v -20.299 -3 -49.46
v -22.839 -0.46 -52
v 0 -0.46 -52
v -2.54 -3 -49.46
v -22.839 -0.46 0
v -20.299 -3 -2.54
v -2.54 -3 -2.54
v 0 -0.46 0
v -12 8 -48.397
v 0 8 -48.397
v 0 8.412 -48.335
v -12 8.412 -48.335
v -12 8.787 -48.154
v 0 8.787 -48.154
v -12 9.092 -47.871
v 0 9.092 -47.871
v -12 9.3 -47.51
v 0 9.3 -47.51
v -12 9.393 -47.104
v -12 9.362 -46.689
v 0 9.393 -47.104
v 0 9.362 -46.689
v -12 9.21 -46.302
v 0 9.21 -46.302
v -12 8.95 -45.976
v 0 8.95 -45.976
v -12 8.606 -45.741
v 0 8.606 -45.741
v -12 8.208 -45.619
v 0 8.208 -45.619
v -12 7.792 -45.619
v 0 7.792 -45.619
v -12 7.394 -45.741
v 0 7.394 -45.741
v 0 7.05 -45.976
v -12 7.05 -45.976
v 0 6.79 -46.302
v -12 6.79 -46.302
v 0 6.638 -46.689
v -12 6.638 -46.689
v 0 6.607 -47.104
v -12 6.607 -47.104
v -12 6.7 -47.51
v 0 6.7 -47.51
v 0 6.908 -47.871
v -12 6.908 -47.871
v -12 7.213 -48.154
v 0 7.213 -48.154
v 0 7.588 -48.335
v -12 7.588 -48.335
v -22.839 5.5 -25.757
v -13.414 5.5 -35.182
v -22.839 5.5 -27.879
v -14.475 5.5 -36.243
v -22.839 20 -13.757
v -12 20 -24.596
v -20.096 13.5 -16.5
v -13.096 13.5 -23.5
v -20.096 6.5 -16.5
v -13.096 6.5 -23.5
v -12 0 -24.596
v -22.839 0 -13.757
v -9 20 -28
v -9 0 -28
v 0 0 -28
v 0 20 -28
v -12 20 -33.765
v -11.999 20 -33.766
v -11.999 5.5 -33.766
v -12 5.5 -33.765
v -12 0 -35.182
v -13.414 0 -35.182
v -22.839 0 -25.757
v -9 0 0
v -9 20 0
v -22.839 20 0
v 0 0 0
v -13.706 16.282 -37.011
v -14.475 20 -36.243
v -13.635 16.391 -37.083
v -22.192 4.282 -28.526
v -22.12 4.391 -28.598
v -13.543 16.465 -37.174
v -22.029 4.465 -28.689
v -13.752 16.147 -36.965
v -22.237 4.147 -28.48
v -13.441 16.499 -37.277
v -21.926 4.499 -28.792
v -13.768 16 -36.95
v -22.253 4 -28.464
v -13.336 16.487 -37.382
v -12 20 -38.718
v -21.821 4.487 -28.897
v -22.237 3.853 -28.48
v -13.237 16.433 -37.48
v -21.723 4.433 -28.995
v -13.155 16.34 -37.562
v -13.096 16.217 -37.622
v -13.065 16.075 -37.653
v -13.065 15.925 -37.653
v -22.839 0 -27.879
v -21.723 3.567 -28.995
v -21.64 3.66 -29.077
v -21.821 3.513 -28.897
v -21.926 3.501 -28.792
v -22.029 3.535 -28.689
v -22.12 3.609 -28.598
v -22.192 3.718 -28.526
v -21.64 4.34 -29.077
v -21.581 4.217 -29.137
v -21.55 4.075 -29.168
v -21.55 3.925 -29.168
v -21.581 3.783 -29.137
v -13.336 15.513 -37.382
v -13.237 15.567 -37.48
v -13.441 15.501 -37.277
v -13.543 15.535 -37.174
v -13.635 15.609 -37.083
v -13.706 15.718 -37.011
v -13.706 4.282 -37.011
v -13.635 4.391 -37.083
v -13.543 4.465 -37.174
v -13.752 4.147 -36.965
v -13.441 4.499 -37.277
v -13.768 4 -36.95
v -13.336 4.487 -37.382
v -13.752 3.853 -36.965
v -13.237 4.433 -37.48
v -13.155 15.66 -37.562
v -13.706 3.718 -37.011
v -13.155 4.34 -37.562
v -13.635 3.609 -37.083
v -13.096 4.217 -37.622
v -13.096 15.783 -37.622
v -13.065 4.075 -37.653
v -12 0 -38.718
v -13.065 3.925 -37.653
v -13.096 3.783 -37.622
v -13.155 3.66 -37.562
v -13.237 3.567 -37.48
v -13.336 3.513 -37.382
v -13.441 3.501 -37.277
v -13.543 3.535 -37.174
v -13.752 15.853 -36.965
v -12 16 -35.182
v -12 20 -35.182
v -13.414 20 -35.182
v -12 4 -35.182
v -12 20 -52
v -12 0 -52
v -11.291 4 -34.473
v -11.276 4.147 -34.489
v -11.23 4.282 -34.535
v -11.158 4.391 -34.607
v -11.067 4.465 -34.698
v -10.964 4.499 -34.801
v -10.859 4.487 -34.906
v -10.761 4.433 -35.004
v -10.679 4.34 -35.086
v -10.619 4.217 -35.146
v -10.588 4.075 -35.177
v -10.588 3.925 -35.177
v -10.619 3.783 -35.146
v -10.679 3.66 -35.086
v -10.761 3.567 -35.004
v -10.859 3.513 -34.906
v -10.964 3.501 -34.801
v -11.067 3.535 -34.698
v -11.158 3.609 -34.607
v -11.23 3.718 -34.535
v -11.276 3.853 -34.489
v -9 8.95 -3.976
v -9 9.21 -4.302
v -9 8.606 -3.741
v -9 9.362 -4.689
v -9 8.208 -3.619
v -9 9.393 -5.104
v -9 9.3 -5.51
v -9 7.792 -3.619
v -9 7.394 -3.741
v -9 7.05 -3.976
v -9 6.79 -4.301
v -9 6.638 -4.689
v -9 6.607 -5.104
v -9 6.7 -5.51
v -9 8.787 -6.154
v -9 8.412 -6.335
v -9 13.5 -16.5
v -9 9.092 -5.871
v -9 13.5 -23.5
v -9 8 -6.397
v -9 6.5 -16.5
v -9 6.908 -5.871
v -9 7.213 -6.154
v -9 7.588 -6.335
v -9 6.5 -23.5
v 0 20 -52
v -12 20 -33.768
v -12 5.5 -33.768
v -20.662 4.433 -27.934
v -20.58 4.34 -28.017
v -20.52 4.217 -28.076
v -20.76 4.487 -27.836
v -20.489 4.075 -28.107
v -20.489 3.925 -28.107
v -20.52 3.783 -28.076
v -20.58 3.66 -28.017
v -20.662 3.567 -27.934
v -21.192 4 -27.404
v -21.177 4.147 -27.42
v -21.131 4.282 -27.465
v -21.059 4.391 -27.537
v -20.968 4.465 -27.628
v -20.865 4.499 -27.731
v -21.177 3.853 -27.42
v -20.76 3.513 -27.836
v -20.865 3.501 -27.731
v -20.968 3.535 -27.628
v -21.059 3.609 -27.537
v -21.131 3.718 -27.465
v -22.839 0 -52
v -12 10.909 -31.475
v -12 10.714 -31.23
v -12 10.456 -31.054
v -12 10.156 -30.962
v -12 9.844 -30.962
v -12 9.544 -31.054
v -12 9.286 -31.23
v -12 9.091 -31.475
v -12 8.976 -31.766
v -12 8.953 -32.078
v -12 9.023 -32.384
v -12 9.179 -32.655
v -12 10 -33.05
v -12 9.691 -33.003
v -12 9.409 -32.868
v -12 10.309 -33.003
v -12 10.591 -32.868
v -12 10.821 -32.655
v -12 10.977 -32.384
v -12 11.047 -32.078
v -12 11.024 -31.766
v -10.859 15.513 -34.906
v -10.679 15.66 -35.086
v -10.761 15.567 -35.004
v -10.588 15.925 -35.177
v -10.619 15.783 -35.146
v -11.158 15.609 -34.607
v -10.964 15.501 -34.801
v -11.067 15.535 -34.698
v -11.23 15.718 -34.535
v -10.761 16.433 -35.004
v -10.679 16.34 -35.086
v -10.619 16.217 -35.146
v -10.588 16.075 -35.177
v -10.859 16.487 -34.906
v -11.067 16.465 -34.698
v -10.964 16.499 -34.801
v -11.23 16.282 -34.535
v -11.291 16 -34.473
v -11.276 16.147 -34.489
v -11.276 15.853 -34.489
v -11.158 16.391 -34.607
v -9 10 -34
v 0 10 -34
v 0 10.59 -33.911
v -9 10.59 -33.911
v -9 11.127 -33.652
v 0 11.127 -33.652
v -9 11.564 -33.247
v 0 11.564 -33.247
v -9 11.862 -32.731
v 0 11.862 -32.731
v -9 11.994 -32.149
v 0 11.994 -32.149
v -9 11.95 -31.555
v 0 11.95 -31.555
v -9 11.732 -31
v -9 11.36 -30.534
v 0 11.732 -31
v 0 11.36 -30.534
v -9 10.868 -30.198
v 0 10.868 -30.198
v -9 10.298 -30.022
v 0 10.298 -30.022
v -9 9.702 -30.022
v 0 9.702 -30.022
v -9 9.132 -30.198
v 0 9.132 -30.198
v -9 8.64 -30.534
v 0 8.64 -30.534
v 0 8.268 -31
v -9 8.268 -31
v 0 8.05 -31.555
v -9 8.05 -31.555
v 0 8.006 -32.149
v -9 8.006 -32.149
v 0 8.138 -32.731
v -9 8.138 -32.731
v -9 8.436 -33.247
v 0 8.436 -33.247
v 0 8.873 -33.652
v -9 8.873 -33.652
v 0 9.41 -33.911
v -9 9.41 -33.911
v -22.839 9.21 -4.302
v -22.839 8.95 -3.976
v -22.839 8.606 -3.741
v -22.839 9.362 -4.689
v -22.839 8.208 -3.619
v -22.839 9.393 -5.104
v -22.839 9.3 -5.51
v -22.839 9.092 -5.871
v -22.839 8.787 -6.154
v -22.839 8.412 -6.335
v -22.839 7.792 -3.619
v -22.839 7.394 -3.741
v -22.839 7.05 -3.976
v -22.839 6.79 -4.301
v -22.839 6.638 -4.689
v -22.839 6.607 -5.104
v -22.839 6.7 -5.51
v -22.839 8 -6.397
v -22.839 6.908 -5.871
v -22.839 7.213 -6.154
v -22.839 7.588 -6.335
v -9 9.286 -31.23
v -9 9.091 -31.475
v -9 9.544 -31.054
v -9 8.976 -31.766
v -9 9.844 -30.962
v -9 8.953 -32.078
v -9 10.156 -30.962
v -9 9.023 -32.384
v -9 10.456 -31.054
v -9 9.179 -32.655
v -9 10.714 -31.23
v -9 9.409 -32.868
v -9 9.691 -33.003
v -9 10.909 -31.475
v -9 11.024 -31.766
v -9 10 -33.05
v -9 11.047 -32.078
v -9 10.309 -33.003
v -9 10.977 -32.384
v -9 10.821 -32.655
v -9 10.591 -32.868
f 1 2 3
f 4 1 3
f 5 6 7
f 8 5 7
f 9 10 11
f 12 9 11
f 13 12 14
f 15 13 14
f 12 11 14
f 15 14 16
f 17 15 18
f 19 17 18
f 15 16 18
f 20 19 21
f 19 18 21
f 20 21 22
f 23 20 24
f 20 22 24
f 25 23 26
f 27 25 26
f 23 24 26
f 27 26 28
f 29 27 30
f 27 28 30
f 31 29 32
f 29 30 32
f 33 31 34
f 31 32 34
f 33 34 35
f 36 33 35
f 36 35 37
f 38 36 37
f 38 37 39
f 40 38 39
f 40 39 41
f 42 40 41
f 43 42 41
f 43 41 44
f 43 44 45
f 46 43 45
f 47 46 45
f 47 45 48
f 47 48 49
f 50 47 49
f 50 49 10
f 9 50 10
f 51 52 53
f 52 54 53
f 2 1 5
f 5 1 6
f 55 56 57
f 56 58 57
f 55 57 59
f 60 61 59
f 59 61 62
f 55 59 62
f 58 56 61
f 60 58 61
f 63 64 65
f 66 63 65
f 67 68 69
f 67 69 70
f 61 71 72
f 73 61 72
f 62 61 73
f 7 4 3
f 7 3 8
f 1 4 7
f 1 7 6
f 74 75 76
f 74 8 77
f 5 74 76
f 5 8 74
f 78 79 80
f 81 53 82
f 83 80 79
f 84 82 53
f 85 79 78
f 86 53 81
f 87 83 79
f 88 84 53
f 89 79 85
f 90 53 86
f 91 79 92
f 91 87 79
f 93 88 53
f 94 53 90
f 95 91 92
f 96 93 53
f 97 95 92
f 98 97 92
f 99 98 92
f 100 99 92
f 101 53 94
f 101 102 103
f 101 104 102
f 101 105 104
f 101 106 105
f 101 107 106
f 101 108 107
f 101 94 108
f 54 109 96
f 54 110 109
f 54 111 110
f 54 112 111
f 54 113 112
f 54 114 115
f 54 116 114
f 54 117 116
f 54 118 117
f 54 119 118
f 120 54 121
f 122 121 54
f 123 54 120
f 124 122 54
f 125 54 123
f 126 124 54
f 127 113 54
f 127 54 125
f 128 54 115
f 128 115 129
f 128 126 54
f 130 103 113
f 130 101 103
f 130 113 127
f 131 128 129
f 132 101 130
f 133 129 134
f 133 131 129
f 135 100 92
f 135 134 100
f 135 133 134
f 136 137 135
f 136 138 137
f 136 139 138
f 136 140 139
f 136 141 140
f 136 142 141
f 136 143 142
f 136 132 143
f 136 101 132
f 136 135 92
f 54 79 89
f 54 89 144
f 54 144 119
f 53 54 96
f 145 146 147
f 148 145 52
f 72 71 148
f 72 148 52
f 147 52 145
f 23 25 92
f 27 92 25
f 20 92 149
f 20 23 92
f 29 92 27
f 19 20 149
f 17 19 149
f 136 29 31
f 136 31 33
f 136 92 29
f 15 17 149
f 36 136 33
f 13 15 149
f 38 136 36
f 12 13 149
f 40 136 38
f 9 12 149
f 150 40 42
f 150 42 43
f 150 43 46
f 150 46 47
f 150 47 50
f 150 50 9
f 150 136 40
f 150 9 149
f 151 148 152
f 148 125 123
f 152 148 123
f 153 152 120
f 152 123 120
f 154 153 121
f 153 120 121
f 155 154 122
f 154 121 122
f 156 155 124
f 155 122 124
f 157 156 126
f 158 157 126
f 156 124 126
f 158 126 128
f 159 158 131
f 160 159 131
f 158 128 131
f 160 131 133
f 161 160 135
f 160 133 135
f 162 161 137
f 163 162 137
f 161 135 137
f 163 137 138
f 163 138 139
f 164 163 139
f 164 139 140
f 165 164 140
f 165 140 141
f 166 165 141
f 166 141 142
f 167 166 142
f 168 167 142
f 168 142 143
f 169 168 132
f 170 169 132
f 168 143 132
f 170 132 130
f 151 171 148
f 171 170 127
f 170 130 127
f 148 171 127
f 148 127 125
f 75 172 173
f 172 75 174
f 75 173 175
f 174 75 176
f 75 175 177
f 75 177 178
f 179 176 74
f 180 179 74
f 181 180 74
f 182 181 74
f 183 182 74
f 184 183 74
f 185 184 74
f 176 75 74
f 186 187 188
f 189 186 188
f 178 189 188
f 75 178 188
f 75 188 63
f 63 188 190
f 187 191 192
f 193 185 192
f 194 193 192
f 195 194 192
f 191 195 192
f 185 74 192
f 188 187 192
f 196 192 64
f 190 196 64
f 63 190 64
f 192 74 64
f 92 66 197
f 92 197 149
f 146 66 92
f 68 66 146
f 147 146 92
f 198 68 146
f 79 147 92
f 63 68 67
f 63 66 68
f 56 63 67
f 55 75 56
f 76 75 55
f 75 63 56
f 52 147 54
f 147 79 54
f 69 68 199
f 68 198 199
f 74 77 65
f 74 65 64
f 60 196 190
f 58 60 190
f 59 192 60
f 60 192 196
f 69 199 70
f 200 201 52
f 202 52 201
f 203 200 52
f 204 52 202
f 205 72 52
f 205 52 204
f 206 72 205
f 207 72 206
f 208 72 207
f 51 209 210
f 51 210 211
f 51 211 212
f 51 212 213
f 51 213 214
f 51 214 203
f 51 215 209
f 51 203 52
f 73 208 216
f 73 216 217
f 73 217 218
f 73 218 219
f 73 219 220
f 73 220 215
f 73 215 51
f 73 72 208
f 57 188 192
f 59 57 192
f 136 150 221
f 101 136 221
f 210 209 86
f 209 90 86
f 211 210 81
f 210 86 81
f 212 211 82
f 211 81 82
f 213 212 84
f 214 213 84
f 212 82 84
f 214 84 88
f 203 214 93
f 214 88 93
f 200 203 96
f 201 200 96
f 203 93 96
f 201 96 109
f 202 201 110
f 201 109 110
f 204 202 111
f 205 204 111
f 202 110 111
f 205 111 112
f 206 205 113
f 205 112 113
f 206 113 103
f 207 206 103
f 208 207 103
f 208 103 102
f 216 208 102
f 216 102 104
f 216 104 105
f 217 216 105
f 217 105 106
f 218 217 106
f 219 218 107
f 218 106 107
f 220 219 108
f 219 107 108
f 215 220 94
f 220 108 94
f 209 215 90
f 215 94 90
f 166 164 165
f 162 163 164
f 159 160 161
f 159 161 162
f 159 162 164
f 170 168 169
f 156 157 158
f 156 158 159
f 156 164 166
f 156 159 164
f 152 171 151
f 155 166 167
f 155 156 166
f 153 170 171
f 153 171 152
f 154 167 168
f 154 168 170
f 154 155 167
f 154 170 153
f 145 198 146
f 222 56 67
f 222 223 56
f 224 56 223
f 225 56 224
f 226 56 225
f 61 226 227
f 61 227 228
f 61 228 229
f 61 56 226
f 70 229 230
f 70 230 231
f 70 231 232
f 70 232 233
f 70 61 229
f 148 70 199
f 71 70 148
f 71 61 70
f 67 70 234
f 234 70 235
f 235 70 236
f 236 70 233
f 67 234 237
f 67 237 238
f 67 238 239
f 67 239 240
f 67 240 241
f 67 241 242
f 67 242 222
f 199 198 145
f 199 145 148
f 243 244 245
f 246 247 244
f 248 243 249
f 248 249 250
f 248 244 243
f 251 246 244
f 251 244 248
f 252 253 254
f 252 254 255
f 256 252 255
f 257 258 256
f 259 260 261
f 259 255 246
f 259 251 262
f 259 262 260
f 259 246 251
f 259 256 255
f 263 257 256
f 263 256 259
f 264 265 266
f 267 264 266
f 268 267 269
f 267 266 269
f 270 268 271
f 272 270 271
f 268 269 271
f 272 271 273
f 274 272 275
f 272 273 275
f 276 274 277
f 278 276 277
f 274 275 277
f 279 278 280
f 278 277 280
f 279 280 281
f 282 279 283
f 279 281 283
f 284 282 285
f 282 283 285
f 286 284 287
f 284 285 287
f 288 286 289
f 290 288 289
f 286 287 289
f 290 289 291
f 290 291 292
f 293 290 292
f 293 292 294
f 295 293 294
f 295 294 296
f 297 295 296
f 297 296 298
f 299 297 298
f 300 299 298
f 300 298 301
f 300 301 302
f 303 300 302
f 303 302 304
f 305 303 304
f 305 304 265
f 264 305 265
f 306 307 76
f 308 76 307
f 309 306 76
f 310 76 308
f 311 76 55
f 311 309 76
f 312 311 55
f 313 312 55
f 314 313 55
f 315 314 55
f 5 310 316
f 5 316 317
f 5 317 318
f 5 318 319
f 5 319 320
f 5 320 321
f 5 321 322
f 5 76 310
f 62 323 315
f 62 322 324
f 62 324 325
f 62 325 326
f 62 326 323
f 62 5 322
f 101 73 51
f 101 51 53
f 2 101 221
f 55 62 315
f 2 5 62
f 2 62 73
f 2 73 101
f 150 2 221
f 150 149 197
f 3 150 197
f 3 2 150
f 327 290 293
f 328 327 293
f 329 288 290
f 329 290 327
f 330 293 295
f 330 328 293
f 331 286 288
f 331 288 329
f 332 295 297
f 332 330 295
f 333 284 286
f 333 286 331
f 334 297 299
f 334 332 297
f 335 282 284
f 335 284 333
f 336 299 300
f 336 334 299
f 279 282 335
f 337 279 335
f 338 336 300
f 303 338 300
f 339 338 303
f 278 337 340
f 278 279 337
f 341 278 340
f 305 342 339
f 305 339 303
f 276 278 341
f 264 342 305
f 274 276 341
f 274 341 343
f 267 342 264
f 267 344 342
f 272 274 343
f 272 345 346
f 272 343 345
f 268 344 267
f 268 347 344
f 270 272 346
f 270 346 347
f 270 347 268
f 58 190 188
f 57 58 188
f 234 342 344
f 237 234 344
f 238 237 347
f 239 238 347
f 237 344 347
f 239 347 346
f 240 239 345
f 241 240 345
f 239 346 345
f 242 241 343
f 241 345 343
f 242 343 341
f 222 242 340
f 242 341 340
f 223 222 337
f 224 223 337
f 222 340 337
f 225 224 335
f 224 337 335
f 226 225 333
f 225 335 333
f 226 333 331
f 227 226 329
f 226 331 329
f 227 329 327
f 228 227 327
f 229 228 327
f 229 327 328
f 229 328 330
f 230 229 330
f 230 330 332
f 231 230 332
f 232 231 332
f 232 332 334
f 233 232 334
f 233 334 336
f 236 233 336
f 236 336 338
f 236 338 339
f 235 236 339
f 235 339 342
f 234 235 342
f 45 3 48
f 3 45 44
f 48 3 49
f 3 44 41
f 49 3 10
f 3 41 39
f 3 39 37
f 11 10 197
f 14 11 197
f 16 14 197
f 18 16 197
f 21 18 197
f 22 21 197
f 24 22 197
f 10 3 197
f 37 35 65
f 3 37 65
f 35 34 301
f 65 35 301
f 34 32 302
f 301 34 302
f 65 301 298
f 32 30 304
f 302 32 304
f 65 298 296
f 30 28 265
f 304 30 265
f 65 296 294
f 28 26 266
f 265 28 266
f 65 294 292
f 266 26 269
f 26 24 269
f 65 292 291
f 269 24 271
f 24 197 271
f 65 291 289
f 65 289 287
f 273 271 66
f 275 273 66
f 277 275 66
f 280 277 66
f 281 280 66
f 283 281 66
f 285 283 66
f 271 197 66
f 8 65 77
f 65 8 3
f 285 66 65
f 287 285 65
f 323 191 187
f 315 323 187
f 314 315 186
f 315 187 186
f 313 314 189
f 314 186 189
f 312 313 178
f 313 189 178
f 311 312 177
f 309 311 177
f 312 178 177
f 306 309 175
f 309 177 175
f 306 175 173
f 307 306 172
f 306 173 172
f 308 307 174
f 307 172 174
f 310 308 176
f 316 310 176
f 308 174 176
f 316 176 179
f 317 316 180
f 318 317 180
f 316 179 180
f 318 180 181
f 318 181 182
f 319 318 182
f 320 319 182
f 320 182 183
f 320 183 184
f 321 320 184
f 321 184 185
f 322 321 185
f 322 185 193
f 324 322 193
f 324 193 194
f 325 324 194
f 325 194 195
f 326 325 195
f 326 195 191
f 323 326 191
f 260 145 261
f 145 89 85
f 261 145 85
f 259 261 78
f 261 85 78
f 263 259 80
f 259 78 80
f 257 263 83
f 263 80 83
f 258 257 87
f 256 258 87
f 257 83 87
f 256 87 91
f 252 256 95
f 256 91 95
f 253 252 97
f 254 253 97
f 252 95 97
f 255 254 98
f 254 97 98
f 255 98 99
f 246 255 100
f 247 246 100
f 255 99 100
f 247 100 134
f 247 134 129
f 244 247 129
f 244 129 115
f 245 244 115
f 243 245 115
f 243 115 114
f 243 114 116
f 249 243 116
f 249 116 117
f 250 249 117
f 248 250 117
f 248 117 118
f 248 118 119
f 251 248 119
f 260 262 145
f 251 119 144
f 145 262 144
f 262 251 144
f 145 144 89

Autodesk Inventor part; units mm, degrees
ref_plane "YZ Plane" through (0, 0, 0) normal (1, 0, 0) x (0, 1, 0)
ref_plane "XZ Plane" through (0, 0, 0) normal (0, 1, 0) x (-1, 0, 0)
ref_plane "XY Plane" through (0, 0, 0) normal (0, 0, 1) x (1, 0, 0)
sketch "Sketch1" plane through (0, 0, 0) normal (0, 1, 0) x (-1, 0, 0)
  line L0 (0, 0) -> (22.8388, 0)
  line L1 (22.8388, 0) -> (22.8388, -52)
  line L2 (22.8388, -52) -> (0, -52)
  line L3 (0, -52) -> (0, 0)
  line L4 (9, 0) -> (9, -16.4645)
  line L5 (12, -24.5962) -> (12, -35.182)
  line L6 (9, -28) -> (0, -28)
  line L7 (12, -35.182) -> (13.4142, -35.182)
  line L8 (13.4142, -35.182) -> (19.7782, -28.818)
  line L9 (19.7782, -28.818) -> (20.8388, -29.8787)
  line L10 (20.8388, -29.8787) -> (12, -38.7175)
  line L11 (12, -38.7175) -> (12, -52)
  line L12 (16.5962, -32) -> (17.6569, -33.0607) construction
  line L13 (16.5962, -32) -> (0, -32) construction
  line L14 (9, -16.4645) -> (9, -28)
  line L15 (20.8388, -29.8787) -> (19.7782, -28.818)
  line L16 (12, -24.5962) -> (21.1924, -15.4038)
  line L17 (16.5962, -32) -> (16.5962, -20) construction
  line L18 (16.5962, -20) -> (9, -20) construction
  line L19 (21.1924, -15.4038) -> (22.8388, -13.7574)
  line L20 (20.8388, -29.8787) -> (22.8388, -27.8787)
  line L21 (19.7782, -28.818) -> (22.8388, -25.7574)
  dimension "d8" = 9
  dimension "d9" = 1.5
  dimension "d10" = 8
  dimension "d11" = 20
  dimension "d12" = 12
  dimension "d18" = 28
  dimension "d46" = 45
  dimension "d48" = 3
  dimension "d49" = 45
  dimension "d50" = 2
  dimension "d51" = 4
  dimension "d52" = 20
extrude "Extrusion2" add sketch "Sketch1" along normal blind 20 contours L0 L1 L19 L16 L5 L7 L8 L9 L10 L11 L2 L3 L6 L14 L4 | L1 L20 L9 L21
sketch "Sketch3" plane through (-9, 0, 0) normal (1, 0, 0) x (0, 0, -1)
  line L0 (0, 0) -> (0, 20) projected
  line L1 (23.5, 13.5) -> (16.5, 13.5)
  line L2 (16.5, 13.5) -> (16.5, 6.5)
  line L3 (16.5, 6.5) -> (23.5, 6.5)
  line L4 (23.5, 6.5) -> (23.5, 13.5)
  circle A0 centre (5, 8) radius 1.397
  point P0 (16.5, 10)
  point P1 (16.5, 10)
  point P2 (0, 10)
  point P3 (20, 0)
  point P4 (20, 0)
  point P5 (20, 0)
  point P6 (20, 6.5)
  point P7 (0, 10)
  dimension "d19" = 2.794
  dimension "d20" = 5
  dimension "d33" = 2
  dimension "d53" = 7
extrude "Extrusion3" cut sketch "Sketch3" against normal up to next
sketch "Sketch4" plane through (0, 0, -28) normal (1, 0, 0) x (0, 0, -1)
  line L0 (24, 0) -> (24, 20) projected
  circle A0 centre (19, 8) radius 1.397
  circle A1 centre (4, 10) radius 2
  circle A2 centre (4, 10) radius 1.05
  point P0 (-28, 0)
  point P1 (24, 10)
  point P2 (24, 10)
  dimension "d23" = 2.794
  dimension "d24" = 4
  dimension "d25" = 2.1
  dimension "d26" = 5
  dimension "d27" = 2
  dimension "d28" = 20
extrude "Extrusion4" cut sketch "Sketch4" against normal up to next contours A0 | A2
extrude "Extrusion5" cut sketch "Sketch4" against normal blind 9 contours A1
sketch "Sketch5" plane through (-20.8388, 0, -29.8787) normal (-0.7071068, 0, -0.7071068) x (-0.7071068, 0, 0.7071068)
  ellipse E0 centre (-7.75, 10) end of major axis (-7.75, 11.05) minor radius 0.7425 projected
  line L0 (-10.5, 4) -> (1.5, 4) construction
  line L1 (1.5, 4) -> (1.5, 16) construction
  line L2 (1.5, 16) -> (-10.5, 16) construction
  line L3 (-10.5, 16) -> (-10.5, 4) construction
  circle A0 centre (-10.5, 16) radius 0.5
  circle A1 centre (-10.5, 4) radius 0.5
  line L4 (-9, 5.5) -> (5.0245, 5.5)
  line L5 (5.0245, 5.5) -> (5.0245, 21.8088)
  line L6 (5.0245, 21.8088) -> (-9, 21.8088)
  line L7 (-9, 21.8088) -> (-9, 5.5)
  circle A2 centre (1.5, 4) radius 0.5
  point P0 (6.3921, 0)
  point P1 (-4.5, 0)
  point P2 (-4.5, 0)
  point P3 (-4.5, 0)
  point P4 (-10.5, 10)
  point P5 (-4.5, 4)
  point P6 (-4.5, 10)
  dimension "d35" = 12
  dimension "d37" = 1
  dimension "d40" = 4.5
  dimension "d41" = 4.5
extrude "Extrusion6" cut sketch "Sketch5" against normal blind 3.5 contours E0 | A0 | A1 | L7 L6 L5 L4 | A2
extrude "Extrusion1" add sketch "Sketch1" against normal blind 3
chamfer "Chamfer1" distance 2.54 angle 45 4 edges at (-22.8388, -3, -26) (-11.4194, -3, -52) (-11.4194, -3, 0) (0, -3, -26)
properties part number "minimal micro scanner"
